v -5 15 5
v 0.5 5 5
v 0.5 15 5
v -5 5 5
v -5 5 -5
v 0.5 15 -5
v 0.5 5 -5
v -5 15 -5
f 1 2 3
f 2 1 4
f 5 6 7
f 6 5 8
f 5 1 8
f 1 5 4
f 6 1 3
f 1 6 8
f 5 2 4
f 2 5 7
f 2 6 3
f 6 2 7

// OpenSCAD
translate([0,10,0]) difference() {
    cube(10, center=true);
    translate([6,5.5,0]) cube(11, center=true);
    translate([6,-5.500000000088,0]) cube(11, center=true);
}
